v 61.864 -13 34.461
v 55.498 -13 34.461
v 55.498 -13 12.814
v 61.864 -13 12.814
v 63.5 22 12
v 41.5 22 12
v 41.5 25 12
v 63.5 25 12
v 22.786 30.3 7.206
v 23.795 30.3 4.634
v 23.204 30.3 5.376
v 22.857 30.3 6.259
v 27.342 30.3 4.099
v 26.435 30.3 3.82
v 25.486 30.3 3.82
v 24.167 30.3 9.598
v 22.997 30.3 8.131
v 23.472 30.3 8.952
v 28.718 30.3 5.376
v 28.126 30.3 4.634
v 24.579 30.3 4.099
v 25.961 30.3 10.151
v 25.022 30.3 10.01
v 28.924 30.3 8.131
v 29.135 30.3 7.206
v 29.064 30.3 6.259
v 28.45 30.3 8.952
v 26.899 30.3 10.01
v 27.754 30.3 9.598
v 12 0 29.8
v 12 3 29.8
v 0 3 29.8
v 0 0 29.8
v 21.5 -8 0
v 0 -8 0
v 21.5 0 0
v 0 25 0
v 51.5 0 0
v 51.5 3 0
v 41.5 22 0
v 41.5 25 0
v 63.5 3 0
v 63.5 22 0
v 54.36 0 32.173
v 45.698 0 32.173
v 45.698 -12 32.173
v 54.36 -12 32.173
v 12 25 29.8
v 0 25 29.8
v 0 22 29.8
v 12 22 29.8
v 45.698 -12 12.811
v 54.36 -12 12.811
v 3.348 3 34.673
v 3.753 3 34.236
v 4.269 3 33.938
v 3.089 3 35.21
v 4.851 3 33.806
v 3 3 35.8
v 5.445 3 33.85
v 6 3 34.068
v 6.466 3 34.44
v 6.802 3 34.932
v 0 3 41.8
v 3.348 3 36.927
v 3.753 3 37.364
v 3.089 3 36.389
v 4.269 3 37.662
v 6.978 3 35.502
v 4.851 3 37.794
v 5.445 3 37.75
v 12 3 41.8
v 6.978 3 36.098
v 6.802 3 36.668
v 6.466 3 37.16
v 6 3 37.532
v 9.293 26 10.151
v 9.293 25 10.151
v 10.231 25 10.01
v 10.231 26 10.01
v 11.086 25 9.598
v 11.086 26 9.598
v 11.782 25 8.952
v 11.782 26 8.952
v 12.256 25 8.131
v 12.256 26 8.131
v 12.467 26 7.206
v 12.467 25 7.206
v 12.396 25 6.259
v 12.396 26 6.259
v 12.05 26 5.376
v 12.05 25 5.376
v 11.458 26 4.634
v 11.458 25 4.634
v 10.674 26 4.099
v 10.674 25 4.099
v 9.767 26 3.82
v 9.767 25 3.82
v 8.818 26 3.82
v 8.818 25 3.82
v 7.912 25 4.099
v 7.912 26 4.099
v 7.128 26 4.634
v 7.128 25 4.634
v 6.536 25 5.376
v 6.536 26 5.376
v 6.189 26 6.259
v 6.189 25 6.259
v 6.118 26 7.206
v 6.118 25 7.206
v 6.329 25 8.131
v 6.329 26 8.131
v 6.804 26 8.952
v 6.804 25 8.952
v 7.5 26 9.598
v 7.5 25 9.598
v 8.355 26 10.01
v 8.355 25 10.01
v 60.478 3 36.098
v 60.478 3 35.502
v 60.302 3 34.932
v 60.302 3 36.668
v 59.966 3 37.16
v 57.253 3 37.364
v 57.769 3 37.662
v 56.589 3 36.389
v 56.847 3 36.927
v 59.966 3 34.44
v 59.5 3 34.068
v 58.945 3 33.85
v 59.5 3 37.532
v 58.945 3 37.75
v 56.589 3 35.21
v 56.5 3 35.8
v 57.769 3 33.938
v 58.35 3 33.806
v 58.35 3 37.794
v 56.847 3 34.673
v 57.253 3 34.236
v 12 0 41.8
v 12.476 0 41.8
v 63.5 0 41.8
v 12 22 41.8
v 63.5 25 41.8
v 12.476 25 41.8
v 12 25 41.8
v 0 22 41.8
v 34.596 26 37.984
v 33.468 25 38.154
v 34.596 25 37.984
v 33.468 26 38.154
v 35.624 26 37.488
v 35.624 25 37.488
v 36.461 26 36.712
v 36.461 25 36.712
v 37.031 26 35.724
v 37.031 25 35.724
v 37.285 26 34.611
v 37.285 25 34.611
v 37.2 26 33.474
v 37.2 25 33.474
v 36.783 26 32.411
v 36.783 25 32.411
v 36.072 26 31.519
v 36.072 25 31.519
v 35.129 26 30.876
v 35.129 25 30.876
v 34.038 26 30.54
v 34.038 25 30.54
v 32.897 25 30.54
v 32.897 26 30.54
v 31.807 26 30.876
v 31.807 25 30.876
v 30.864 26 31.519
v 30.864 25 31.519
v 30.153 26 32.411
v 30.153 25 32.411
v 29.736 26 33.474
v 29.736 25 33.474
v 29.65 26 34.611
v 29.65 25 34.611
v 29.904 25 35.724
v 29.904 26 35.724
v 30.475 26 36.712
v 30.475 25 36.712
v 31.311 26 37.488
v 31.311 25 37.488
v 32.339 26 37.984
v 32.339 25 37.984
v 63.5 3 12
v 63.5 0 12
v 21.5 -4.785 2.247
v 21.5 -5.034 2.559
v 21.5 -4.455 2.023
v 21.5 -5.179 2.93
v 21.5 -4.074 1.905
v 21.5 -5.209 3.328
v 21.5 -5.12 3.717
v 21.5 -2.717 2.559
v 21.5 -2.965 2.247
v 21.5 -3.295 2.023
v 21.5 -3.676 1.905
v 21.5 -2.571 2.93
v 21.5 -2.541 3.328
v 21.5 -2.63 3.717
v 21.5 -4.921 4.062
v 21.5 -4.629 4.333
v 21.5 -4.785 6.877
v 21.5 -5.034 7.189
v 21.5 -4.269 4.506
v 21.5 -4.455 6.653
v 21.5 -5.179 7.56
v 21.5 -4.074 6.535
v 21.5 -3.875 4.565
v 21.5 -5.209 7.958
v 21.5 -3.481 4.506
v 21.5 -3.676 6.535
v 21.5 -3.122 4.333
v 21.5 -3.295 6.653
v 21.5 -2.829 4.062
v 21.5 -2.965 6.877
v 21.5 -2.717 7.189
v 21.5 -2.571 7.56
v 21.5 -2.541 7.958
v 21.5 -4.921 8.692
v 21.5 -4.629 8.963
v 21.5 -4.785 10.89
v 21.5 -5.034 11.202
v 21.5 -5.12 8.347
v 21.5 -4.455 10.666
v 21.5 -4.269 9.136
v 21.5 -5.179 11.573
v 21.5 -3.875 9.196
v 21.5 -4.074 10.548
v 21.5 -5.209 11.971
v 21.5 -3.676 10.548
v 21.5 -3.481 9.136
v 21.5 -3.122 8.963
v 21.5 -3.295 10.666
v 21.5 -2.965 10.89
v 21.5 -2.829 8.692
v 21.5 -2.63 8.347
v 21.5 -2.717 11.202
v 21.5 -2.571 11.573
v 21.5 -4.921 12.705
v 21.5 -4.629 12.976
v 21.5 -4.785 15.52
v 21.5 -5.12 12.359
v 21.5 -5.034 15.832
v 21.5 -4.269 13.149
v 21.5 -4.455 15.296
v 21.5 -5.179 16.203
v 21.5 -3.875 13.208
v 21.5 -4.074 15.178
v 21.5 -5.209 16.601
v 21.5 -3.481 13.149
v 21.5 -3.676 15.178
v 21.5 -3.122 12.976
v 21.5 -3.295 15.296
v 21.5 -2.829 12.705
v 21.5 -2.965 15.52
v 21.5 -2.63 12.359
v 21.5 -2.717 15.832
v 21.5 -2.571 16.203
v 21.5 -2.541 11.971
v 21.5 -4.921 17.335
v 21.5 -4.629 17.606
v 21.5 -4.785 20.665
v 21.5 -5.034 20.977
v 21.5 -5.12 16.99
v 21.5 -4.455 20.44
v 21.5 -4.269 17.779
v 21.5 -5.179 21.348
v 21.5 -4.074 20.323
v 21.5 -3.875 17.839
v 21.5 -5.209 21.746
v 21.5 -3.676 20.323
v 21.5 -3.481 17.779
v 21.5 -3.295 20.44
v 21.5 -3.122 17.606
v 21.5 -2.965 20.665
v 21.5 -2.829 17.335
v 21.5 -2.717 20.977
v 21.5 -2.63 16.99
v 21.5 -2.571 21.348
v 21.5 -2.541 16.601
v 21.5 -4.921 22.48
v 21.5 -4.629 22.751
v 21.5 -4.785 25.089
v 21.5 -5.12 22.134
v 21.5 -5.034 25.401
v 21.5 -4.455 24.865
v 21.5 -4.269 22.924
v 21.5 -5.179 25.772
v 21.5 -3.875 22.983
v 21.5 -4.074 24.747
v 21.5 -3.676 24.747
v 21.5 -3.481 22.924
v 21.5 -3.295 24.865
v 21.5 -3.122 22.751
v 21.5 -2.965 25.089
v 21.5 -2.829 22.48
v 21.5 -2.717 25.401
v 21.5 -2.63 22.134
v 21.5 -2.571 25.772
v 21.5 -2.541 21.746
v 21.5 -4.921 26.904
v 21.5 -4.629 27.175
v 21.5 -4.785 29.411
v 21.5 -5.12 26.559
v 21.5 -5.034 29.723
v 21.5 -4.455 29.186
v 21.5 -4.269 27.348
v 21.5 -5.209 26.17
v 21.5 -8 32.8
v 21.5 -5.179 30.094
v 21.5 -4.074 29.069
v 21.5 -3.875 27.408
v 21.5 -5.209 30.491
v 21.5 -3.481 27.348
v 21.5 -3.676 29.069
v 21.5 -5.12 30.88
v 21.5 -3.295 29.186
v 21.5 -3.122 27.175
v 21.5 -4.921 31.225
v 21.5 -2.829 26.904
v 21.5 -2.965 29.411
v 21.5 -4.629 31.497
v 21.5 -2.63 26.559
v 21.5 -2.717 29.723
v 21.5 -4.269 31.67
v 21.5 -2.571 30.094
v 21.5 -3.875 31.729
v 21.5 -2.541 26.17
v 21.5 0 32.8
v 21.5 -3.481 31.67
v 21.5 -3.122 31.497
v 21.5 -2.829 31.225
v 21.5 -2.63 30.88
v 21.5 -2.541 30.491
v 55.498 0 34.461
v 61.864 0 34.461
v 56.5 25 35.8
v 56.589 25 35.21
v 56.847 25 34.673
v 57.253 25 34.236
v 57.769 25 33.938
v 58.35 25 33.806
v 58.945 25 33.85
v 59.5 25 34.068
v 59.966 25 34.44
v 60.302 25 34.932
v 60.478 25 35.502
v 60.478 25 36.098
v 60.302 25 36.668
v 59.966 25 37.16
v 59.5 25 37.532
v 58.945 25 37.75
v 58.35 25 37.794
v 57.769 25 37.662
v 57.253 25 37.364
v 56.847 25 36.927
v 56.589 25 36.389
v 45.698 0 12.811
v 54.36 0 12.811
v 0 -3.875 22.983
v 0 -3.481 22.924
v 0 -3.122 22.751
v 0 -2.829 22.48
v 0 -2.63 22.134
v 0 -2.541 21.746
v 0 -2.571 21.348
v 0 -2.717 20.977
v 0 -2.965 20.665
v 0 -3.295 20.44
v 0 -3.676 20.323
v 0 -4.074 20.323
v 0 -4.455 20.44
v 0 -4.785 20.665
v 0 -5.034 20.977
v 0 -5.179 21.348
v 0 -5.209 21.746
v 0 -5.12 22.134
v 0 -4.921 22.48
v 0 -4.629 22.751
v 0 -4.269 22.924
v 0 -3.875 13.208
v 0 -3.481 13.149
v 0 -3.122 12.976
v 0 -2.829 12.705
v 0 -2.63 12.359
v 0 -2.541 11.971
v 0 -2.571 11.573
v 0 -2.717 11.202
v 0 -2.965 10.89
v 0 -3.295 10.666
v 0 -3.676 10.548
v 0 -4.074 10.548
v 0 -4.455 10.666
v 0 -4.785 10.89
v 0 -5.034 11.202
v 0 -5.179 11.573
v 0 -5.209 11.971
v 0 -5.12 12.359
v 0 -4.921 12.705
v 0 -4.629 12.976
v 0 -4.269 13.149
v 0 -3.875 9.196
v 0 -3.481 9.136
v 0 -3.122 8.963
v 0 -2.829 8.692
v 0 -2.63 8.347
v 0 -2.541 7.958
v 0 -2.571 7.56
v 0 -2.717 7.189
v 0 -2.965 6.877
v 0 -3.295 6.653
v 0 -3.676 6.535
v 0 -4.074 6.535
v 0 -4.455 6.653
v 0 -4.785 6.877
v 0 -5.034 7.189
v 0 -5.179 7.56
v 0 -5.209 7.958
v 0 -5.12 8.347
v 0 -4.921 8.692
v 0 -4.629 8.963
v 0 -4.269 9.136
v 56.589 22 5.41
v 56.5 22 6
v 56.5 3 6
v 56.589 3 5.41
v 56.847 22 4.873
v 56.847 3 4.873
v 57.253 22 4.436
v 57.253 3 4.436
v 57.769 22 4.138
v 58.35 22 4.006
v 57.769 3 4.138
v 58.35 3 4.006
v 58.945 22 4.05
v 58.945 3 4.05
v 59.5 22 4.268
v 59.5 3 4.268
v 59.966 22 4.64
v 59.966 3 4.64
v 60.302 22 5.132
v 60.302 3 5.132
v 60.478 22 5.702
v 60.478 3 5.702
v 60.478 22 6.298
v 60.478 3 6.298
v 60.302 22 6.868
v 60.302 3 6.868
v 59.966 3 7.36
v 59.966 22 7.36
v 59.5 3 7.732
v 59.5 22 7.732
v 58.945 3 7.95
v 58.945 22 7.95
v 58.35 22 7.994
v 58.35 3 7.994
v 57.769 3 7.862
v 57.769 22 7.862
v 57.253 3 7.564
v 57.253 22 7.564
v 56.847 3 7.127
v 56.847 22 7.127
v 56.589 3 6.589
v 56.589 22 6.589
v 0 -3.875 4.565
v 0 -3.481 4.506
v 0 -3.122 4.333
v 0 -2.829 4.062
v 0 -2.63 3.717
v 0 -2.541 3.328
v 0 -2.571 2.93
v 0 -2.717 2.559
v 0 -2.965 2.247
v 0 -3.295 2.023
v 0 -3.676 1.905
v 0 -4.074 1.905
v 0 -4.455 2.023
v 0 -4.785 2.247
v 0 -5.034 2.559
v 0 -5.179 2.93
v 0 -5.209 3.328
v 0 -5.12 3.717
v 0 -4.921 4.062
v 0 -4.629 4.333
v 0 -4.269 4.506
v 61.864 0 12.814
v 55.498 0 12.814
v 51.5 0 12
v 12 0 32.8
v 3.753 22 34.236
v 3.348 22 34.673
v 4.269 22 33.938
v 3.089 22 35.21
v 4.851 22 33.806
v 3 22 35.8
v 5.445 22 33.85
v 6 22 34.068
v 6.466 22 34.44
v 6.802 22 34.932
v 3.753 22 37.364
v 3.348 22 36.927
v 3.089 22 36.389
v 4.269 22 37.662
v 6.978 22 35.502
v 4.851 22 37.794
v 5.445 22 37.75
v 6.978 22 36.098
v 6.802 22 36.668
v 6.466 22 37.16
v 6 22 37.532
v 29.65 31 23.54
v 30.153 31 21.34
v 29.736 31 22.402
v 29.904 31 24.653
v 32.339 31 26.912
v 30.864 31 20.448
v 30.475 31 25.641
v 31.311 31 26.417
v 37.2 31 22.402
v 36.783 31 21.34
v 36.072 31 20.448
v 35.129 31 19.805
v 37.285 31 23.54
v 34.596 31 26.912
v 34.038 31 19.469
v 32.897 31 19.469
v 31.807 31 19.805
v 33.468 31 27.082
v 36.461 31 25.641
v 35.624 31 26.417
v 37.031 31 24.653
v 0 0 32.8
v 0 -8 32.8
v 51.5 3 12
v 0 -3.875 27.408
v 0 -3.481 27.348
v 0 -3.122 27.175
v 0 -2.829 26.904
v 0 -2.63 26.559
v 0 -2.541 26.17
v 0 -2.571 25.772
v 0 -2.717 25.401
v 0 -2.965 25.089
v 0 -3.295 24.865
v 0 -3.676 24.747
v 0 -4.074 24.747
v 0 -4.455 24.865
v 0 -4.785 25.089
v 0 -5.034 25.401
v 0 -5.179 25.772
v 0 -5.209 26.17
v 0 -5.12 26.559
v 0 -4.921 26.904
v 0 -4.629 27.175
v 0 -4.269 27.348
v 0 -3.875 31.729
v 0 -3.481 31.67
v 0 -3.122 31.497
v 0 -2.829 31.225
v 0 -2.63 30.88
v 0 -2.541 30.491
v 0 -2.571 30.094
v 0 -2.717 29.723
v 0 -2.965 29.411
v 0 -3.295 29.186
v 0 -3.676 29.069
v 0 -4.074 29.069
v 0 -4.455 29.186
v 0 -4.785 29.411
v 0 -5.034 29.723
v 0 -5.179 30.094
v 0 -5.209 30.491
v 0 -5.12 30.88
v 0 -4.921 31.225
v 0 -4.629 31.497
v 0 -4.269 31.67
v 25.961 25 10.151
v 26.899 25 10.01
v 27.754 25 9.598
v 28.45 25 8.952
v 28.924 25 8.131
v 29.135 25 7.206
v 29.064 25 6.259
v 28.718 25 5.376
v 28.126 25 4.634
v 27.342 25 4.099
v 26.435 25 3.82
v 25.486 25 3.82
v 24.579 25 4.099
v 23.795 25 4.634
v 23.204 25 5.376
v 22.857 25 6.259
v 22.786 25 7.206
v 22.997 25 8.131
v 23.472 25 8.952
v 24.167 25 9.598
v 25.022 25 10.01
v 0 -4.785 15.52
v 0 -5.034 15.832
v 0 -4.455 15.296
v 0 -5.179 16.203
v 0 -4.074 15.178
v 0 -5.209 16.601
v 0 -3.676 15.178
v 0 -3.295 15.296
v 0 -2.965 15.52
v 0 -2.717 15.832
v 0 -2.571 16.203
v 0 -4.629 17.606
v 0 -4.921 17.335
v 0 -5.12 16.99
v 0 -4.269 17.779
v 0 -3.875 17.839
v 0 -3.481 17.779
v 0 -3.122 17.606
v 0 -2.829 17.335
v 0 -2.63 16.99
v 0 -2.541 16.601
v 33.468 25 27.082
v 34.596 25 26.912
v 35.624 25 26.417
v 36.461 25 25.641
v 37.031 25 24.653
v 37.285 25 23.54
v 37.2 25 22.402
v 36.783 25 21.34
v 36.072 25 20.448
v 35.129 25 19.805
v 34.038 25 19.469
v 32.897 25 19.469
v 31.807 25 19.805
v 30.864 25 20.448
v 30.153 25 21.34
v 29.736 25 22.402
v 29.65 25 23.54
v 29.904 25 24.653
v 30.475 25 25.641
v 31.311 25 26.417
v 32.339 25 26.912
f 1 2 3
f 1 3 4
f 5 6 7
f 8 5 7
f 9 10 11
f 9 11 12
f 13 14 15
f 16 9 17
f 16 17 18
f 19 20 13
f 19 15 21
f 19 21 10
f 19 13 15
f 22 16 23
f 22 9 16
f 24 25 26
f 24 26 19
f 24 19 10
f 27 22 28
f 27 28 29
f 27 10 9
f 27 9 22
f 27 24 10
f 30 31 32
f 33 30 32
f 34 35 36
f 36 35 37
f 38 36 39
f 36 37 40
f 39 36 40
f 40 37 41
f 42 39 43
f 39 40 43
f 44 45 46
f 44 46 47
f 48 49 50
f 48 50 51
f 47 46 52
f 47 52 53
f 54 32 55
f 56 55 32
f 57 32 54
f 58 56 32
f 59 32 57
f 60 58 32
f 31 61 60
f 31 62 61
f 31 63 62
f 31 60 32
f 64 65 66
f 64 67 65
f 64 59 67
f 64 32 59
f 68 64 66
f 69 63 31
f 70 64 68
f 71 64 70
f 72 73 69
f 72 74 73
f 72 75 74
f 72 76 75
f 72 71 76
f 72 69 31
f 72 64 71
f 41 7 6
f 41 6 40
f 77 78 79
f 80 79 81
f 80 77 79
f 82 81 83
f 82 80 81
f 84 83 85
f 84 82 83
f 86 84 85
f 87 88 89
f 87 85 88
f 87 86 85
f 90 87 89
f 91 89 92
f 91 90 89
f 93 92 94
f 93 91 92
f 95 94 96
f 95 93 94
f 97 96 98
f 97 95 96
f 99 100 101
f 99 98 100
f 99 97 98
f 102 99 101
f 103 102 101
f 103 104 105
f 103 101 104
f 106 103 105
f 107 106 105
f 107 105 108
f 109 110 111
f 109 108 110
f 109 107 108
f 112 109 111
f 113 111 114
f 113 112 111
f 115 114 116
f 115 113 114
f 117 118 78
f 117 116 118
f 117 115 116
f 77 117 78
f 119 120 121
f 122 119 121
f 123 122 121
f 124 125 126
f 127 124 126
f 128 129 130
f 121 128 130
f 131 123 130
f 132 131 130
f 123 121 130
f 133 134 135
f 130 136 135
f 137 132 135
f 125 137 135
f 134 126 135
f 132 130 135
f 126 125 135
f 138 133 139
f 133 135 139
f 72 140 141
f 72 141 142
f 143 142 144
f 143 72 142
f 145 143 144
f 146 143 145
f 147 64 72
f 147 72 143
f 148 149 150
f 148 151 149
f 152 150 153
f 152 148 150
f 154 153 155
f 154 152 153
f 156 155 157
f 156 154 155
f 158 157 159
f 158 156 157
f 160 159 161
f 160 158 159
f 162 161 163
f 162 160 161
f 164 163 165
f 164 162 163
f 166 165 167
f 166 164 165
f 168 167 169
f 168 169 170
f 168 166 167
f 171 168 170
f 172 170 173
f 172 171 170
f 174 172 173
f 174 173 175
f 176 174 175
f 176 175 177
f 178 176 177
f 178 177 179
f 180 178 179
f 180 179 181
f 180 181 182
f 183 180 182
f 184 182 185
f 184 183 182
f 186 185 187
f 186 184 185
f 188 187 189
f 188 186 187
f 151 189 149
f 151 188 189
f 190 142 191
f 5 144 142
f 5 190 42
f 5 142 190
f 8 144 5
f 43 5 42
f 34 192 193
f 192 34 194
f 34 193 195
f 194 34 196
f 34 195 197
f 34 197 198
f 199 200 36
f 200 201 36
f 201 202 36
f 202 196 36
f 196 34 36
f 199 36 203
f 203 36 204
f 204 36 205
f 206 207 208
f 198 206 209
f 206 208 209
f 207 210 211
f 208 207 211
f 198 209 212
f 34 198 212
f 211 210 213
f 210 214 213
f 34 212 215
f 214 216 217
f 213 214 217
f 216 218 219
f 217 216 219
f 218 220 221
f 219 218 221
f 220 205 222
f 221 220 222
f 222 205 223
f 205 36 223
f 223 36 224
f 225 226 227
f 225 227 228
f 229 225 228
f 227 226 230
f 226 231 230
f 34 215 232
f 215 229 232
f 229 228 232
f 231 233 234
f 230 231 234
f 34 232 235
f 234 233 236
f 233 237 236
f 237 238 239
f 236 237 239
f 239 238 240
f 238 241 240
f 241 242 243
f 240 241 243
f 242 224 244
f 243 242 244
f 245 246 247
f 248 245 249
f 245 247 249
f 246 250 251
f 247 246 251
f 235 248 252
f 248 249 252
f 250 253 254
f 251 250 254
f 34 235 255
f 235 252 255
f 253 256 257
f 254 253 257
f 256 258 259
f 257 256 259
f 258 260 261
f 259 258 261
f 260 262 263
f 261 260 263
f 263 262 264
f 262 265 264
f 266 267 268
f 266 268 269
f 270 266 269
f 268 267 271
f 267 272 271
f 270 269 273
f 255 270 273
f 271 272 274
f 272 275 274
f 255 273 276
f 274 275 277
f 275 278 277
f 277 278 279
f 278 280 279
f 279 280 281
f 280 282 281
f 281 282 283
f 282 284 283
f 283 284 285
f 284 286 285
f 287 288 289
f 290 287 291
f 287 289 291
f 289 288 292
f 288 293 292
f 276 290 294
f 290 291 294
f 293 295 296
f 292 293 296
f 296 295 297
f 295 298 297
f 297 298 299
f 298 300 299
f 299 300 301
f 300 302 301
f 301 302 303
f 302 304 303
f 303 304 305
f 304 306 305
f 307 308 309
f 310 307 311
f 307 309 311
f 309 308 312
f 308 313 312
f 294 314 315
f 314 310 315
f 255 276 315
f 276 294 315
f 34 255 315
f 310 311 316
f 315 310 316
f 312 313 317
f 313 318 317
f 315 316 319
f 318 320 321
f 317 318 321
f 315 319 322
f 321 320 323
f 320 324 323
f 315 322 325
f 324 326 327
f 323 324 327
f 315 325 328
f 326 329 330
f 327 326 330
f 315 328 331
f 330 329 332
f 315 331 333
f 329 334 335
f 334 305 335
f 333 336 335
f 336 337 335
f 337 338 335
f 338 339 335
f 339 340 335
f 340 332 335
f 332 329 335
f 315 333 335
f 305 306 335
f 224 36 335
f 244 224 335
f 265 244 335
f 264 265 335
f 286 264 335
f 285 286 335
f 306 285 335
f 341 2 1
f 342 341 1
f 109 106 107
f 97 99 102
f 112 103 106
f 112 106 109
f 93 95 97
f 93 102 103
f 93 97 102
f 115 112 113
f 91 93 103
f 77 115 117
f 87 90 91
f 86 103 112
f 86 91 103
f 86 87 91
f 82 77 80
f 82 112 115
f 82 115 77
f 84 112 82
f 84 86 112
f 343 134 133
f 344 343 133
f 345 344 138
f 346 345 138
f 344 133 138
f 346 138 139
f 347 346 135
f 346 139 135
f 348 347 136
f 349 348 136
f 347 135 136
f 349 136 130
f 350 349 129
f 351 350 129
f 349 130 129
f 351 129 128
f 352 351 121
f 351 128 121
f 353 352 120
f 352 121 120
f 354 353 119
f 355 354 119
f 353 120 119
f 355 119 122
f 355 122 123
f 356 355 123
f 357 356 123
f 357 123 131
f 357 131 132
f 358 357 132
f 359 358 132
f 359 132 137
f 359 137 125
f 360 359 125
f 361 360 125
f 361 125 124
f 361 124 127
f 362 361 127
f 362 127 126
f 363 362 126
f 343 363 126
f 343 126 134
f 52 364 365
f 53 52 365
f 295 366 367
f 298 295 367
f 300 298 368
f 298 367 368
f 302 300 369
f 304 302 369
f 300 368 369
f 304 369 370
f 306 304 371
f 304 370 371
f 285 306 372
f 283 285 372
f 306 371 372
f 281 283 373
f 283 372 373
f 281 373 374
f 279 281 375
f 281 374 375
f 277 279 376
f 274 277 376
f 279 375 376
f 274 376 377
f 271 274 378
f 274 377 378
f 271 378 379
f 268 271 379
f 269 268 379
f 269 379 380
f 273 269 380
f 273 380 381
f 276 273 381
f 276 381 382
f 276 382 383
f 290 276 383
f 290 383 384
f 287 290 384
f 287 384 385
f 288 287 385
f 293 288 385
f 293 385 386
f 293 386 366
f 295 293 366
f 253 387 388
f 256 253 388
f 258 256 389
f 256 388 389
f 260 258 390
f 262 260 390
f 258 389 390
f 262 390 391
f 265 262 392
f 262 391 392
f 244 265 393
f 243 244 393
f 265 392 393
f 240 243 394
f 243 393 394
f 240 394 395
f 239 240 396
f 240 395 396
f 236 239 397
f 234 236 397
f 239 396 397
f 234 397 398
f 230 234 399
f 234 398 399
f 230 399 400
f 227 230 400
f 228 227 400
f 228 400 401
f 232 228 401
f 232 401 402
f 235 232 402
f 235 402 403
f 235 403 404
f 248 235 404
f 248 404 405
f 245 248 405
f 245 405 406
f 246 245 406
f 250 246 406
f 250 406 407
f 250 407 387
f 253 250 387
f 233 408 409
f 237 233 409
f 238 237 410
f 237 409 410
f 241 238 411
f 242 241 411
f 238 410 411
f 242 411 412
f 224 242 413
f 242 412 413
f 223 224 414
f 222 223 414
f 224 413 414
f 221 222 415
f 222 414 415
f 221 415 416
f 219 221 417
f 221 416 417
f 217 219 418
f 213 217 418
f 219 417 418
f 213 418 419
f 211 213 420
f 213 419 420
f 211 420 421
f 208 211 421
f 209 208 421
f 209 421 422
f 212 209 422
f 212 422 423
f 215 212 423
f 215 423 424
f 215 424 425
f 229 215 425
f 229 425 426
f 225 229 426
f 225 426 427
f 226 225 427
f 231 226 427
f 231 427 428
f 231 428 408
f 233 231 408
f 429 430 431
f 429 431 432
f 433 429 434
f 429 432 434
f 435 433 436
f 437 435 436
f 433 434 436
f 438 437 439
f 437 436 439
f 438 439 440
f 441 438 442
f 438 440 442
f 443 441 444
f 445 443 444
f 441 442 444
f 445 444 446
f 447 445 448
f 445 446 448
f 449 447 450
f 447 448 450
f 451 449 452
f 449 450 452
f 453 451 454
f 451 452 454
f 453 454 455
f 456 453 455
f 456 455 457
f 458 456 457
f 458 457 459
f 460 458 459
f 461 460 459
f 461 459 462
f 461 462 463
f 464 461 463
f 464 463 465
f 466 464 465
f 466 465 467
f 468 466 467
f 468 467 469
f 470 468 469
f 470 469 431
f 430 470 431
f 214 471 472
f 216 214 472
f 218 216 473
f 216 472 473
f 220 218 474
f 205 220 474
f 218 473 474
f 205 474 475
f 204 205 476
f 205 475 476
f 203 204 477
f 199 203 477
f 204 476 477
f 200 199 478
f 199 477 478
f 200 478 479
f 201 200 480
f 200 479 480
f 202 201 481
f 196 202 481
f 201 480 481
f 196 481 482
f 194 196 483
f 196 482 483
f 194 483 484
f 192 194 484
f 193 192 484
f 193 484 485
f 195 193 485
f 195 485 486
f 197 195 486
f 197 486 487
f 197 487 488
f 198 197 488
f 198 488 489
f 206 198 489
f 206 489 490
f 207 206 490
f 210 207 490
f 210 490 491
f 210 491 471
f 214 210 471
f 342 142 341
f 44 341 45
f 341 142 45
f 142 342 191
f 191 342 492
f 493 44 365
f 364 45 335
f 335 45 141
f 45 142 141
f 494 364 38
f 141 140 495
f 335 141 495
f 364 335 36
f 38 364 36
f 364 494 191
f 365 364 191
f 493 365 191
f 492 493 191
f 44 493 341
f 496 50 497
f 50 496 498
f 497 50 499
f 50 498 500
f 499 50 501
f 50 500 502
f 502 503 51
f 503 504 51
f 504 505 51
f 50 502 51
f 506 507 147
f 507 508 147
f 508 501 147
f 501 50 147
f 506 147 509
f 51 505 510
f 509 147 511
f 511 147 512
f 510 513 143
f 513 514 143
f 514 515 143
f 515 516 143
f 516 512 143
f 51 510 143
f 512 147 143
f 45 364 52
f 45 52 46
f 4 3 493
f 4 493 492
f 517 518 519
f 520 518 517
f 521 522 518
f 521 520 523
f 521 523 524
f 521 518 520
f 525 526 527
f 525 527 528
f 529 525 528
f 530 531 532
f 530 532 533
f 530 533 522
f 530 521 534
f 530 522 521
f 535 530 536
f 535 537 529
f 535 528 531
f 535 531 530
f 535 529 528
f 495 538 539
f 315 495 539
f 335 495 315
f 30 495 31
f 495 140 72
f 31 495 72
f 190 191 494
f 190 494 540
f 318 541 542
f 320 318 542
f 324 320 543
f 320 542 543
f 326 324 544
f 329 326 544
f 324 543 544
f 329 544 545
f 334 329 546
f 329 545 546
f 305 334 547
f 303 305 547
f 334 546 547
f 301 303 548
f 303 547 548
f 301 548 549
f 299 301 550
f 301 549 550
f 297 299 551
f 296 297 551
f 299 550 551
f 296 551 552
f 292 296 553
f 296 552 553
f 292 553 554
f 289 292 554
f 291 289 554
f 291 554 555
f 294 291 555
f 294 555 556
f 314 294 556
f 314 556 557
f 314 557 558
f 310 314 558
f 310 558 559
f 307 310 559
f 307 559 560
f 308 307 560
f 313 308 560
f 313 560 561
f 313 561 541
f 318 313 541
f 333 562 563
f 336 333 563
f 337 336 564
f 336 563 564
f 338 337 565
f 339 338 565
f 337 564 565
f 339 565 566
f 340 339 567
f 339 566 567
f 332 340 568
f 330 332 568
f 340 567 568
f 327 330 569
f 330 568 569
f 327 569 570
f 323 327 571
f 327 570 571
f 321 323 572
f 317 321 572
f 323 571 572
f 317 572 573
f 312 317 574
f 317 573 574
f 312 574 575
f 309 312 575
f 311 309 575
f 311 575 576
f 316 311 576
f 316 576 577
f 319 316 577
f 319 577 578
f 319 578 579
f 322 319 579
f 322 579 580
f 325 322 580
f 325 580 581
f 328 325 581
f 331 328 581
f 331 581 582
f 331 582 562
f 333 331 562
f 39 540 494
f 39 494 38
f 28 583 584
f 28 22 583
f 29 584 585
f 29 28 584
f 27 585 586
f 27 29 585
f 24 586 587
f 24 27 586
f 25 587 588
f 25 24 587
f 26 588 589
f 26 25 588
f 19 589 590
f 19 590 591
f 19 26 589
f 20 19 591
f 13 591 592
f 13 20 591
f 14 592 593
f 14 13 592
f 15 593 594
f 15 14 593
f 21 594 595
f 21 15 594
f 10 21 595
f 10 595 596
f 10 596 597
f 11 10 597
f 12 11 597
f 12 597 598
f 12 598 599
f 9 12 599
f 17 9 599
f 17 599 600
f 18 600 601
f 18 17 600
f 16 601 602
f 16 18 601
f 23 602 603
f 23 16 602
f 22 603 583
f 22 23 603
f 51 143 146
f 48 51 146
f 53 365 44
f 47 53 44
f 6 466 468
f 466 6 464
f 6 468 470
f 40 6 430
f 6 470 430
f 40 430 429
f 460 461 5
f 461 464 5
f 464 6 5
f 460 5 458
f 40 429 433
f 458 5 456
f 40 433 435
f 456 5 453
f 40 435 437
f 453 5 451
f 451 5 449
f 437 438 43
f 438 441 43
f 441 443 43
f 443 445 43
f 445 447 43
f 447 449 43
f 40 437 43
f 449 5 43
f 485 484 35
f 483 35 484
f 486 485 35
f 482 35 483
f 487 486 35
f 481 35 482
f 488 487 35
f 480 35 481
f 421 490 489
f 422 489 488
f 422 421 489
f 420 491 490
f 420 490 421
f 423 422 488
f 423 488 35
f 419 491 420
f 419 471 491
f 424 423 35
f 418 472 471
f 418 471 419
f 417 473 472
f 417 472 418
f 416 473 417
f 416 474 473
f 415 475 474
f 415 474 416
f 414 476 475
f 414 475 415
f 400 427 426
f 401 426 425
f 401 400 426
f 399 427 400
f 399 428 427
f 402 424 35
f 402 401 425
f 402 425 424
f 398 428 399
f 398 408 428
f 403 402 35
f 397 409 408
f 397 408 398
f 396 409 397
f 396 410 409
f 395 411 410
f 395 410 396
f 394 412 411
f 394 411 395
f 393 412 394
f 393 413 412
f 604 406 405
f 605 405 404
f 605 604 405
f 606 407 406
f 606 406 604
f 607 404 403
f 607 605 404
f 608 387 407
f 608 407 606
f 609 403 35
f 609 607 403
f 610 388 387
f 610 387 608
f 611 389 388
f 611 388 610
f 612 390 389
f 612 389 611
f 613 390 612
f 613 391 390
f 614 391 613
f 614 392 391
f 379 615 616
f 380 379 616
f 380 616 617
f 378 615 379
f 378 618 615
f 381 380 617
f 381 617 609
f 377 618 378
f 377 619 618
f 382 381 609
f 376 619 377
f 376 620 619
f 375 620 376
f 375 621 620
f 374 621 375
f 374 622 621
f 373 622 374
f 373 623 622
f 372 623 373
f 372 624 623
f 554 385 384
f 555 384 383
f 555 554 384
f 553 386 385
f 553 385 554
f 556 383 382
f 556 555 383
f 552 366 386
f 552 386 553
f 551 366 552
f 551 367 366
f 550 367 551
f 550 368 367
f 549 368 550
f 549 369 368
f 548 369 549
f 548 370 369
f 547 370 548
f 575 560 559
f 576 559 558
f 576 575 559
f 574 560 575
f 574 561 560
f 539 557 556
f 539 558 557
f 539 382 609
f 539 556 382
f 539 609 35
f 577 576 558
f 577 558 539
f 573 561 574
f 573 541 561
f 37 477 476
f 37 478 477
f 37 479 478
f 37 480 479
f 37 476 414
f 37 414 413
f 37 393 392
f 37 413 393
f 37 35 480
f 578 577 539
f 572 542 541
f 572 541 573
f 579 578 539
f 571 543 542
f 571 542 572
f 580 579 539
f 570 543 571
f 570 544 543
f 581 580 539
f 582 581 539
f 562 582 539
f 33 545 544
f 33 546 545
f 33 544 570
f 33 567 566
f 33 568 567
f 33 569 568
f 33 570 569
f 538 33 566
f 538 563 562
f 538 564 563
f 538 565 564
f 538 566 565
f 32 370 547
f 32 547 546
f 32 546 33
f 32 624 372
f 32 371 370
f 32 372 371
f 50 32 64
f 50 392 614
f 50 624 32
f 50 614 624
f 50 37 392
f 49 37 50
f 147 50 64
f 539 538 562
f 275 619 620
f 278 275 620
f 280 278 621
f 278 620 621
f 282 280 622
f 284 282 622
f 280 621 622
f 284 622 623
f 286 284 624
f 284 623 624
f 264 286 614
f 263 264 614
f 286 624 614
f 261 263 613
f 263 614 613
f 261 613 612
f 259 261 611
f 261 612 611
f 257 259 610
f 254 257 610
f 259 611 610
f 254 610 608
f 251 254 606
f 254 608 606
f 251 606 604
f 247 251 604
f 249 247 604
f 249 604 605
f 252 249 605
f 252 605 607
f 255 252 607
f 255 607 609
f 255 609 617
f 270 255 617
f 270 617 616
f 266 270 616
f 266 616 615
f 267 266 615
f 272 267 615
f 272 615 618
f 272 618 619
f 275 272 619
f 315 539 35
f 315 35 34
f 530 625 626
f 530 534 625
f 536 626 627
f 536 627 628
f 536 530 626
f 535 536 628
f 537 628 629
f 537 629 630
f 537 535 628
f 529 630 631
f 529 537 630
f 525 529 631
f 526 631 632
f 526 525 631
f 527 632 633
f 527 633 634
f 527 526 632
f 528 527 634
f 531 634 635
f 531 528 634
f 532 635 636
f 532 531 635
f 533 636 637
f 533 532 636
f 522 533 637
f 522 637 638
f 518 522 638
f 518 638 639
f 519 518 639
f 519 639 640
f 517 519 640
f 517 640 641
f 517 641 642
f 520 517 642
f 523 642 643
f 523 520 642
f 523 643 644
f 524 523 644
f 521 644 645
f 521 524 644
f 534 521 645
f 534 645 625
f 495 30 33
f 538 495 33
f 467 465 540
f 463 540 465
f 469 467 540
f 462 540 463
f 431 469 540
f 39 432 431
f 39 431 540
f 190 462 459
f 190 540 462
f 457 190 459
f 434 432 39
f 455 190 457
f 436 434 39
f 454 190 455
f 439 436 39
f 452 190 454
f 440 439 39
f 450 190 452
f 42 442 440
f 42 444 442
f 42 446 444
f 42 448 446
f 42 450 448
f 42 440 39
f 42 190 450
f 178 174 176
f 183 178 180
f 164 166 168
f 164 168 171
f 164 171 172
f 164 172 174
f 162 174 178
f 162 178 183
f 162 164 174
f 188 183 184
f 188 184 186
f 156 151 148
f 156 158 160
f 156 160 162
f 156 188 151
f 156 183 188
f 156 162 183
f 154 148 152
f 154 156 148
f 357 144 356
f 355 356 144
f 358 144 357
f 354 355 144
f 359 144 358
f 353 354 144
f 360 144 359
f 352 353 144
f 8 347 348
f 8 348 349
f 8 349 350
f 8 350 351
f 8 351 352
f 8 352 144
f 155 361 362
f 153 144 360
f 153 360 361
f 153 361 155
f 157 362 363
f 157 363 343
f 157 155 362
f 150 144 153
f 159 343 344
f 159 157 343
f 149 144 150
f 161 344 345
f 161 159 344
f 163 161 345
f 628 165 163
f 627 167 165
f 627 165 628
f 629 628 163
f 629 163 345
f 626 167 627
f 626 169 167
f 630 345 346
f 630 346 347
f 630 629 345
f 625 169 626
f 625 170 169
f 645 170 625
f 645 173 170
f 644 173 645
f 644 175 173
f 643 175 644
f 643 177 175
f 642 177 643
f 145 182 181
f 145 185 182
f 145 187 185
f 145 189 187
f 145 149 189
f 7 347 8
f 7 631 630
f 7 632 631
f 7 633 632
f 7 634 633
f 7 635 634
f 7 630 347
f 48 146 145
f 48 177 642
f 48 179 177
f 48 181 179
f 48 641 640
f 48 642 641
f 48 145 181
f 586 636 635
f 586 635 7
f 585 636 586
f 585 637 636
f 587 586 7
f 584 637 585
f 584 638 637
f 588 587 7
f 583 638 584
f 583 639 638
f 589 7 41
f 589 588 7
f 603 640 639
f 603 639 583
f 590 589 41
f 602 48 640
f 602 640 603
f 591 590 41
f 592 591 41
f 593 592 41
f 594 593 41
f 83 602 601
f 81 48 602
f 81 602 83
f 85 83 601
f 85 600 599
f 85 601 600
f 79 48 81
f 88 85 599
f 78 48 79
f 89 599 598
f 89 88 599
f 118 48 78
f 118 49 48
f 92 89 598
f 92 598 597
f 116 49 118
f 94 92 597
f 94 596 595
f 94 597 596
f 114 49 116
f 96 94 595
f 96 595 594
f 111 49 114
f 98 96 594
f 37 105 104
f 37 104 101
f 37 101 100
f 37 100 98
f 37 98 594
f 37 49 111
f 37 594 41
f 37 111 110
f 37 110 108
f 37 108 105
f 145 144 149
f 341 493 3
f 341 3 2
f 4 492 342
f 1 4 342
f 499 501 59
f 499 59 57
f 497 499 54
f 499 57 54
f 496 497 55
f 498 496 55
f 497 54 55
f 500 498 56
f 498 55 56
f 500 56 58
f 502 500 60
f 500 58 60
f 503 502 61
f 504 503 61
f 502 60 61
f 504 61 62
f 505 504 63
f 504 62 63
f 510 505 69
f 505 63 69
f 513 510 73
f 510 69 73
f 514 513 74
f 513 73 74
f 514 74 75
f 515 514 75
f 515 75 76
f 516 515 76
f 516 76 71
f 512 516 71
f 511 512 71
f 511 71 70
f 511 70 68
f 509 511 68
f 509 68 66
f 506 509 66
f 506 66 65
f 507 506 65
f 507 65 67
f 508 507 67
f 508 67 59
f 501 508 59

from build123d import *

# Parameters (mm, degrees)
SKETCH_1_W               = 3.183433307
SKETCH_1_H               = 0.999998
SKETCH_2_W               = 12.476289143
SKETCH_2_H               = 38.015688009
EXTRUDE_1_DEPTH          = 24.99995
SKETCH_3_W               = 12.476289143
SKETCH_3_H               = 24.99995
EXTRUDE_2_DEPTH          = 3.784228391
SKETCH_4_W               = 41.7999164
SKETCH_4_H               = 24.99995
EXTRUDE_3_DEPTH          = 51.023583857
SKETCH_6_W               = 21.499957
SKETCH_6_H               = 32.7999344
EXTRUDE_5_DEPTH          = 7.999984
SKETCH_7_W               = 11.999976
SKETCH_7_H               = 2.999994
CUT_EXTRUDE_1_DEPTH      = 8.999982
CUT_EXTRUDE_2_REACH      = 76.808
SKETCH_9_W               = 11.999976
SKETCH_9_H               = 2.999994
SKETCH_10_W              = 6.366689606
SKETCH_10_H              = 21.646744661
EXTRUDE_6_DEPTH          = 12.999974
SKETCH_11_W              = 11.999976
SKETCH_11_H              = 2.999994
CUT_EXTRUDE_3_DEPTH      = 11.999976
SKETCH_12_W              = 11.999976
SKETCH_12_H              = 2.999994
CUT_EXTRUDE_4_DEPTH      = 21.999956
SKETCH_13_W              = 11.999976
SKETCH_13_H              = 2.999994
CUT_EXTRUDE_5_DEPTH      = 11.999976
SKETCH_14_W              = 8.66186009
SKETCH_14_H              = 19.361804907
EXTRUDE_7_DEPTH          = 11.999976
SKETCH_15_W              = 3.82824354
SKETCH_15_H              = 0.999998
SKETCH_16_W              = 3.82824354
SKETCH_16_H              = 6
SKETCH_17_W              = 3.183433307
SKETCH_17_H              = 5.3
HOLE_WIZARD_M3_5_4_D     = 3.999992
HOLE_WIZARD_M3_5_4_DEPTH = 21.999956
HOLE_WIZARD_1_D          = 2.675202715
HOLE_WIZARD_1_DEPTH      = 21.499957
HOLE_WIZARD_M3_5_5_D     = 3.999992
HOLE_WIZARD_M3_5_5_DEPTH = 34.99993


with BuildPart() as part:
    # 草图1 → 旋转1 (revolve)
    with BuildSketch(Plane(origin=(0, 0, 6.967661698), x_dir=(-1, 0, 0), z_dir=(0, 0, -1)), mode=Mode.PRIVATE) as revolve_1_sk:
        with Locations((-10.88457249, 25.499949)):
            Rectangle(SKETCH_1_W, SKETCH_1_H)
    revolve(revolve_1_sk.sketch.rotate(Axis((9.292855836, 24.99995, 6.967661698), (0, 1, 0)), 270), axis=Axis((9.292855836, 24.99995, 6.967661698), (0, 1, 0)))

    # 草图2 → 凸台-拉伸1 (add)
    with BuildSketch(Plane(origin=(0, 24.99995, 0), x_dir=(1, 0, 0), z_dir=(0, 1, 0))):
        with Locations((6.238144572, -22.792072395)):
            Rectangle(SKETCH_2_W, SKETCH_2_H)
    extrude(amount=-EXTRUDE_1_DEPTH)

    # 草图3 → 凸台-拉伸2 (add)
    with BuildSketch(Plane(origin=(0, 0, 3.784228391), x_dir=(-1, 0, 0), z_dir=(0, 0, -1))):
        with Locations((-6.238144572, 12.499975)):
            Rectangle(SKETCH_3_W, SKETCH_3_H)
    extrude(amount=EXTRUDE_2_DEPTH)

    # 草图4 → 凸台-拉伸3 (add)
    with BuildSketch(Plane(origin=(12.476289143, 0, 0), x_dir=(0, 0, -1), z_dir=(1, 0, 0))):
        with Locations((-20.8999582, 12.499975)):
            Rectangle(SKETCH_4_W, SKETCH_4_H)
    extrude(amount=EXTRUDE_3_DEPTH)

    # 草图6 → 凸台-拉伸5 (add)
    with BuildSketch(Plane.XZ):
        with Locations((10.7499785, 16.3999672)):
            Rectangle(SKETCH_6_W, SKETCH_6_H)
    extrude(amount=EXTRUDE_5_DEPTH)

    # 草图7 → 切除-拉伸1 (cut)
    with BuildSketch(Plane.XY.offset(41.7999164)):
        with Locations((5.999988, 1.499997)):
            Rectangle(SKETCH_7_W, SKETCH_7_H)
    extrude(amount=-CUT_EXTRUDE_1_DEPTH, mode=Mode.SUBTRACT)

    # 草图9 → 切除-拉伸2 (cut, up to next)
    with BuildSketch(Plane(origin=(0, 0, 29.7999404), x_dir=(-1, 0, 0), z_dir=(0, 0, -1)), mode=Mode.PRIVATE) as cut_extrude_2_sk1:
        with Locations((-5.999988, 1.499997)):
            Rectangle(SKETCH_9_W, SKETCH_9_H)
    cut_extrude_2_tool1 = extrude(cut_extrude_2_sk1.sketch, amount=-CUT_EXTRUDE_2_REACH, mode=Mode.PRIVATE) & part.part
    add(cut_extrude_2_tool1.solids().sort_by_distance((5.999988, 1.499997, 29.79994))[0], mode=Mode.SUBTRACT)

    # 草图10 → 凸台-拉伸6 (add)
    with BuildSketch(Plane.XZ):
        with Locations((58.681033534, 23.637634731)):
            Rectangle(SKETCH_10_W, SKETCH_10_H)
    extrude(amount=EXTRUDE_6_DEPTH)

    # 草图11 → 切除-拉伸3 (cut)
    with BuildSketch(Plane.XY.offset(41.7999164)):
        with Locations((5.999988, 23.499953)):
            Rectangle(SKETCH_11_W, SKETCH_11_H)
    extrude(amount=-CUT_EXTRUDE_3_DEPTH, mode=Mode.SUBTRACT)

    # 草图12 → 切除-拉伸4 (cut)
    with BuildSketch(Plane(origin=(63.499873, 0, 0), x_dir=(0, 0, -1), z_dir=(1, 0, 0))):
        with Locations((-5.999988, 23.499953)):
            Rectangle(SKETCH_12_W, SKETCH_12_H)
    extrude(amount=-CUT_EXTRUDE_4_DEPTH, mode=Mode.SUBTRACT)

    # 草图13 → 切除-拉伸5 (cut)
    with BuildSketch(Plane(origin=(63.499873, 0, 0), x_dir=(0, 0, -1), z_dir=(1, 0, 0))):
        with Locations((-5.999988, 1.499997)):
            Rectangle(SKETCH_13_W, SKETCH_13_H)
    extrude(amount=-CUT_EXTRUDE_5_DEPTH, mode=Mode.SUBTRACT)

    # 草图14 → 凸台-拉伸7 (add)
    with BuildSketch(Plane.XZ):
        with Locations((50.029008896, 22.492211894)):
            Rectangle(SKETCH_14_W, SKETCH_14_H)
    extrude(amount=EXTRUDE_7_DEPTH)

    # 草图15 → 旋转2 (revolve)
    with BuildSketch(Plane(origin=(0, 0, 34.32537348), x_dir=(-1, 0, 0), z_dir=(0, 0, -1)), mode=Mode.PRIVATE) as revolve_2_sk:
        with Locations((-35.382002405, 25.499949)):
            Rectangle(SKETCH_15_W, SKETCH_15_H)
    revolve(revolve_2_sk.sketch.rotate(Axis((33.467880635, 24.99995, 34.32537348), (0, 1, 0)), 270), axis=Axis((33.467880635, 24.99995, 34.32537348), (0, 1, 0)))

    # 草图16 → 旋转3 (revolve)
    with BuildSketch(Plane(origin=(0, 0, 23.254177941), x_dir=(-1, 0, 0), z_dir=(0, 0, -1)), mode=Mode.PRIVATE) as revolve_3_sk:
        with Locations((-35.382002405, 27.99995)):
            Rectangle(SKETCH_16_W, SKETCH_16_H)
    revolve(revolve_3_sk.sketch.rotate(Axis((33.467880635, 24.99995, 23.254177941), (0, 1, 0)), 270), axis=Axis((33.467880635, 24.99995, 23.254177941), (0, 1, 0)))

    # 草图17 → 旋转4 (revolve)
    with BuildSketch(Plane(origin=(0, 0, 6.967661698), x_dir=(-1, 0, 0), z_dir=(0, 0, -1)), mode=Mode.PRIVATE) as revolve_4_sk:
        with Locations((-27.552434059, 27.64995)):
            Rectangle(SKETCH_17_W, SKETCH_17_H)
    revolve(revolve_4_sk.sketch.rotate(Axis((25.960717405, 24.99995, 6.967661698), (0, 1, 0)), 270), axis=Axis((25.960717405, 24.99995, 6.967661698), (0, 1, 0)))

    # M3.5 间隙孔4
    with Locations(Plane(origin=(0, 24.99995, 0), x_dir=(1, 0, 0), z_dir=(0, 1, 0))):
        with Locations((58.499883, -35.7999284)):
            Hole(HOLE_WIZARD_M3_5_4_D / 2, depth=HOLE_WIZARD_M3_5_4_DEPTH)

    # 孔1
    with Locations(Plane(origin=(21.499957, 0, 0), x_dir=(0, 0, -1), z_dir=(1, 0, 0))):
        with Locations((-16.500963355, -3.875126559), (-21.645583961, -3.875126559), (-26.069957682, -3.875126559), (-30.391438991, -3.875126559), (-11.870804809, -3.875126559), (-7.858000737, -3.875126559), (-3.227842192, -3.875126559)):
            Hole(HOLE_WIZARD_1_D / 2, depth=HOLE_WIZARD_1_DEPTH)

    # M3.5 间隙孔5
    with Locations(Plane(origin=(0, 21.999956, 0), x_dir=(1, 0, 0), z_dir=(0, 1, 0))):
        with Locations((58.499883, -5.999988), (4.99999, -35.7999284)):
            Hole(HOLE_WIZARD_M3_5_5_D / 2, depth=HOLE_WIZARD_M3_5_5_DEPTH)


solid = part.part
